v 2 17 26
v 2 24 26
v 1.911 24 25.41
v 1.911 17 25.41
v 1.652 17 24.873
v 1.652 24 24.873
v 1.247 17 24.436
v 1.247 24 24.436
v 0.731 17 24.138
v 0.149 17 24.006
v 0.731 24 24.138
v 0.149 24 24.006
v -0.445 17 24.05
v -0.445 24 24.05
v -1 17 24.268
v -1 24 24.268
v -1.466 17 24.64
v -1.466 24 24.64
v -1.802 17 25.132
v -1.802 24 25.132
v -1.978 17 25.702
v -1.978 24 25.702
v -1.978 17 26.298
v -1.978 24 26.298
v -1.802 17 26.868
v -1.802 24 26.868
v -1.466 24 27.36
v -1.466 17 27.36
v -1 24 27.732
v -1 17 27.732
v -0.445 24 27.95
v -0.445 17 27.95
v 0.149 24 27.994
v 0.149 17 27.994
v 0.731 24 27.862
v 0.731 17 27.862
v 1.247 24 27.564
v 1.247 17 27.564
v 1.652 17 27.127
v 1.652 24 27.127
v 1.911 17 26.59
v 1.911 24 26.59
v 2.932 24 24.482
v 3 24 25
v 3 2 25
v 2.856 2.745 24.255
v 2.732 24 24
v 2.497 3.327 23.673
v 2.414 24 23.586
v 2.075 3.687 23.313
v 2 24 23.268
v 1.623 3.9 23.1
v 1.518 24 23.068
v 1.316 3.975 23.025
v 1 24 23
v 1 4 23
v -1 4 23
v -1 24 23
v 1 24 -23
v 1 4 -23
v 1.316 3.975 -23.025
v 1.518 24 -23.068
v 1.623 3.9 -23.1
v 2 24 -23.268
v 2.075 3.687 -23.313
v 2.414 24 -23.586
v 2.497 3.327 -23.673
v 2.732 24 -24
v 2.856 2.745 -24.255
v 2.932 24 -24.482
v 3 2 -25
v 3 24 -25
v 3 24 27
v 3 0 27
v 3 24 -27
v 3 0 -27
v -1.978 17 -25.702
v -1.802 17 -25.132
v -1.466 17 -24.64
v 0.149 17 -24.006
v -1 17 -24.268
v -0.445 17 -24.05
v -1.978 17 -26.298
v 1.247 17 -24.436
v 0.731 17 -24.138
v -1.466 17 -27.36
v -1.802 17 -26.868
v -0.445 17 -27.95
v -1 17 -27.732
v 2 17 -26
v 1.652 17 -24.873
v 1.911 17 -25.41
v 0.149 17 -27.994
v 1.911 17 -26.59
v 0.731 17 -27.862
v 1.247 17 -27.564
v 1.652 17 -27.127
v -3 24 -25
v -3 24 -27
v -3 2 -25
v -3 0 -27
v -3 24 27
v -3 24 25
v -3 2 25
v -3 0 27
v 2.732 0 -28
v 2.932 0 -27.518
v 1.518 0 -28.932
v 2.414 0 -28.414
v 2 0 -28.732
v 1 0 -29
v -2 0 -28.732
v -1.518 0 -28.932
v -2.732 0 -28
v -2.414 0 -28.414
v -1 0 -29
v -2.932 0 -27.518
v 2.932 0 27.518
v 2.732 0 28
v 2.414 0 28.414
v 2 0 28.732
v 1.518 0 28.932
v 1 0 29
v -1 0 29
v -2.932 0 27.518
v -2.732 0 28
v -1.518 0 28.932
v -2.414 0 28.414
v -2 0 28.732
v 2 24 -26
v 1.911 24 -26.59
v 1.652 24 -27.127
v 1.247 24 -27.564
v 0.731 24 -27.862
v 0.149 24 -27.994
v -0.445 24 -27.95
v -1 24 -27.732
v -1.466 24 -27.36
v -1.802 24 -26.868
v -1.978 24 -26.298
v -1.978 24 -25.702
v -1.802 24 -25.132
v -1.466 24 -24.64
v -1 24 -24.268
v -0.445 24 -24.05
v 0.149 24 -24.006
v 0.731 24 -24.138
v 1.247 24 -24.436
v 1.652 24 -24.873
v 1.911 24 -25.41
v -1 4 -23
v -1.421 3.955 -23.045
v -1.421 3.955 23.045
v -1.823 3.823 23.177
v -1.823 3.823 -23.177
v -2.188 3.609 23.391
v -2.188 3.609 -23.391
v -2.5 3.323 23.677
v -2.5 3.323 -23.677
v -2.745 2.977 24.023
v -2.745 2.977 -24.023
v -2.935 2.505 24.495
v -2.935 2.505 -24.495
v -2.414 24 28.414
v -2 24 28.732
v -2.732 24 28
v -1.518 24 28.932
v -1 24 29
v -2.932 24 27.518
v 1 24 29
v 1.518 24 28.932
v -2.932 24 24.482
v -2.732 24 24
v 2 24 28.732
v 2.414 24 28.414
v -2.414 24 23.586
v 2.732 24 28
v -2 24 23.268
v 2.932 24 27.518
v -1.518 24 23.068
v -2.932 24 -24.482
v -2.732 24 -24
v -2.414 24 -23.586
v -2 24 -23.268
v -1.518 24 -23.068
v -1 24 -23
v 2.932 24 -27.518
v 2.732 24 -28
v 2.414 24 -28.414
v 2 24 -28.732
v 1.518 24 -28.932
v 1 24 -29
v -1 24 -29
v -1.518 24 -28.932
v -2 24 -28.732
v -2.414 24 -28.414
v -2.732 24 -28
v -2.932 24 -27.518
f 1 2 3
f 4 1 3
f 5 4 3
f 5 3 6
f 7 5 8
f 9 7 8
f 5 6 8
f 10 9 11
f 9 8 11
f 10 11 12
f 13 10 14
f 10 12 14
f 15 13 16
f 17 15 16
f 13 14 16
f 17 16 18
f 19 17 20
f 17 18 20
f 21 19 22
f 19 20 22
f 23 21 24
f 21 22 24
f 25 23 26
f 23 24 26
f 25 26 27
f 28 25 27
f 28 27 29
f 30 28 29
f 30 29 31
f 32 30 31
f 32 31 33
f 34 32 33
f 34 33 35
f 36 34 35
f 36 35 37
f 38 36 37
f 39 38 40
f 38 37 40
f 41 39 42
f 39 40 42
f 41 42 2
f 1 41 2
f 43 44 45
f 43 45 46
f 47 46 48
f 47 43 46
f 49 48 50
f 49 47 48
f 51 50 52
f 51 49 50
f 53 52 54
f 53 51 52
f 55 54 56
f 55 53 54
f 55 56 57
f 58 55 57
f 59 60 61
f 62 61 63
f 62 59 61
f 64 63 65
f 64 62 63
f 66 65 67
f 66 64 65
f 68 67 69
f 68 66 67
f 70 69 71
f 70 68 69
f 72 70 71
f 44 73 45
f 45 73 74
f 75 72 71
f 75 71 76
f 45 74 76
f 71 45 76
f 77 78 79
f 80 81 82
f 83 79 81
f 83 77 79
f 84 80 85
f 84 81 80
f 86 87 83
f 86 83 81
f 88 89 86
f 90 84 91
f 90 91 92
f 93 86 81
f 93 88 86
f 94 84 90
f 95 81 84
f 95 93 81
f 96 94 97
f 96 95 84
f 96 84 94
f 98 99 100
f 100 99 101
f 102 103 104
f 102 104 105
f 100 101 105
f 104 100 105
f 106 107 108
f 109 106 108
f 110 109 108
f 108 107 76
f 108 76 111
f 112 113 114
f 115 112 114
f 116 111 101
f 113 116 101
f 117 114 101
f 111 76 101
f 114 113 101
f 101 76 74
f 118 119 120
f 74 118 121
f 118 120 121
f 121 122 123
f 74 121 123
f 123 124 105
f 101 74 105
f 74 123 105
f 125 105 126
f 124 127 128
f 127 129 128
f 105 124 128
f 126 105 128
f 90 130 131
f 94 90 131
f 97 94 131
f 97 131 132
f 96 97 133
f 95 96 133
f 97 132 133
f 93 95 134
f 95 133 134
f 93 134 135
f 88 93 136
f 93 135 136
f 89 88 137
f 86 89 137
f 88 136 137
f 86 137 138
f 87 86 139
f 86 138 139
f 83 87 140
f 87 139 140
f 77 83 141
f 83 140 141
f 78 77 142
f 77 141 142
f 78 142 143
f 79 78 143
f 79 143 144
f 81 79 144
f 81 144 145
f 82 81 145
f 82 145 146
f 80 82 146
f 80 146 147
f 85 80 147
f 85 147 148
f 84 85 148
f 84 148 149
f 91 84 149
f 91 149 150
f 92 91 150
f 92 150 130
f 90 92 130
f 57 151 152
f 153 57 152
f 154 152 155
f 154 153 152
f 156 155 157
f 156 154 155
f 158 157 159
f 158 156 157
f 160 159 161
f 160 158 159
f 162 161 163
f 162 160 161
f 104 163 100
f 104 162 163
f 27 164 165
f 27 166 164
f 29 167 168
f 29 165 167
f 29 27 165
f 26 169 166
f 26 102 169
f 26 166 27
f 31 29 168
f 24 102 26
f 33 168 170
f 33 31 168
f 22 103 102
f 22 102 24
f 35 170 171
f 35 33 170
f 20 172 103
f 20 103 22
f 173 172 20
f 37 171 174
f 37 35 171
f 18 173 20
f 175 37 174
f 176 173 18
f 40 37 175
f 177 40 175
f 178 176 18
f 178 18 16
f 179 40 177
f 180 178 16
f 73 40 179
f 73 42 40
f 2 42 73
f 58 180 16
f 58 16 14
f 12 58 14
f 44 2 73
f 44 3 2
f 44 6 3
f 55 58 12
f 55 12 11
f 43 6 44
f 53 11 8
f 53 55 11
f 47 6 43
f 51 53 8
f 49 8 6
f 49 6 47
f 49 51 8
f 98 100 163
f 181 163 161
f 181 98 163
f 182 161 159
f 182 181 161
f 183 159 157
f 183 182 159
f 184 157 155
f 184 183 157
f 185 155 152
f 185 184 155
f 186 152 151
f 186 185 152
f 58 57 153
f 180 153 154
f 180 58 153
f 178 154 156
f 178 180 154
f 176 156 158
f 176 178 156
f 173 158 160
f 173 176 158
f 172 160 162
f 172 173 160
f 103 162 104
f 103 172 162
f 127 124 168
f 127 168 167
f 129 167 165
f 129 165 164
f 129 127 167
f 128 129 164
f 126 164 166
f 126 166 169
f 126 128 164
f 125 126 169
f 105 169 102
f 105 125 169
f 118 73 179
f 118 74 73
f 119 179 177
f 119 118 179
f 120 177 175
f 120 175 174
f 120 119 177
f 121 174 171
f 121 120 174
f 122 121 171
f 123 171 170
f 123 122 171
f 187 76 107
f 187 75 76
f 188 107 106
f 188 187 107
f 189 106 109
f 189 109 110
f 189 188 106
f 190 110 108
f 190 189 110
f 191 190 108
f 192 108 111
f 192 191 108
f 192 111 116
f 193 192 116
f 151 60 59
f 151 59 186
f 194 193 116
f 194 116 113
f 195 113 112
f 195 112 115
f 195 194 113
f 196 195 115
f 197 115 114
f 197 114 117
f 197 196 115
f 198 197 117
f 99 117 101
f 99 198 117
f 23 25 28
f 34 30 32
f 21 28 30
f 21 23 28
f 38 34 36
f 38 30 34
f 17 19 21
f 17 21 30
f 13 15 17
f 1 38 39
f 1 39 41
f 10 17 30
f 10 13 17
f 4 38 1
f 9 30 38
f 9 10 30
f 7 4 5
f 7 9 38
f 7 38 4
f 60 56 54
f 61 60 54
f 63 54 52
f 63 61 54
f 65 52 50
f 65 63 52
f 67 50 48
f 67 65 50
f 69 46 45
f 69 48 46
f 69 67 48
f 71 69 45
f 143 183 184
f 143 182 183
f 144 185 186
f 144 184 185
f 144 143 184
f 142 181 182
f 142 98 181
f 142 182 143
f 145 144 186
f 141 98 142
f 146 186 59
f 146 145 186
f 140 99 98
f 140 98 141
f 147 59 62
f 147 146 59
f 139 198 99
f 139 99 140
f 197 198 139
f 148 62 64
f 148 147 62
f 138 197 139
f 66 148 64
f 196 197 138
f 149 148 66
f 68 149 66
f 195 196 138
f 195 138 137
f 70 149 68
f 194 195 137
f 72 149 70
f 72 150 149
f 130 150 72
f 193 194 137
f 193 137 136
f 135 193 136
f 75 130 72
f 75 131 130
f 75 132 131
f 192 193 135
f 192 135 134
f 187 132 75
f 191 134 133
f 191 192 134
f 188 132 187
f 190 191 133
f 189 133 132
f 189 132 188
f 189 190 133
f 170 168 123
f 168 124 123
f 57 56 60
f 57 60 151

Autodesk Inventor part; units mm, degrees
ref_plane "YZ Plane" through (0, 0, 0) normal (1, 0, 0) x (0, 1, 0)
ref_plane "XZ Plane" through (0, 0, 0) normal (0, 1, 0) x (-1, 0, 0)
ref_plane "XY Plane" through (0, 0, 0) normal (0, 0, 1) x (1, 0, 0)
sketch "Sketch1" plane through (0, 0, 0) normal (0, 1, 0) x (-1, 0, 0)
  line L0 (-3, -29) -> (3, -29)
  line L1 (3, -29) -> (3, 29)
  line L2 (3, 29) -> (-3, 29)
  line L3 (-3, 29) -> (-3, -29)
  line L4 (-3, -29) -> (3, 29) construction
  line L5 (3, -29) -> (-3, 29) construction
  point P0 (0, 0)
  dimension "d0" = 58
  dimension "d1" = 6
extrude "Main Body Extrusion" add sketch "Sketch1" along normal blind 4
sketch "Sketch2" plane through (0, 4, 0) normal (0, 1, 0) x (1, 0, 0)
  line L0 (-3, 29) -> (-3, -29) projected
  line L1 (3, -29) -> (3, 29) projected
  line L2 (-3, -29) -> (3, -29)
  line L3 (3, -29) -> (3, -23)
  line L4 (3, -23) -> (-3, -23)
  line L5 (-3, -23) -> (-3, -29)
  line L6 (3, 29) -> (-3, 29) projected
  line L7 (-3, 29) -> (3, 29)
  line L8 (3, 29) -> (3, 23)
  line L9 (3, 23) -> (-3, 23)
  line L10 (-3, 23) -> (-3, 29)
  point P0 (0, 0)
  dimension "d4" = 6
  dimension "d5" = 6
  dimension "d6" = 6
  dimension "d7" = 6
  dimension "d8" = 6
extrude "Side Beams Extrusion" add sketch "Sketch2" along normal blind 20 contours L6 L1 L9 L0 | L4 L1 L2 L0
sketch "Sketch3" plane through (0, 24, 0) normal (0, 1, 0) x (1, 0, 0)
  line L0 (-3, 23) -> (-3, -23) projected
  line L1 (3, -23) -> (3, 23) projected
  circle A0 centre (0, 26) radius 2
  line L2 (-3, 23) -> (3, 23) projected
  line L3 (3, 29) -> (-3, 29) projected
  circle A1 centre (0, -26) radius 2
  line L4 (-3, -29) -> (3, -29) projected
  line L5 (3, -29) -> (3, -23) projected
  point P0 (0, 0)
  dimension "d11" = 6
  dimension "d12" = 4
  dimension "d13" = 3
  dimension "d14" = 6
  dimension "d15" = 3
  dimension "d16" = 4
  dimension "d17" = 3
  dimension "d18" = 3
extrude "Extrusion3" cut sketch "Sketch3" against normal blind 7
fillet "Fillet1" radius 2 10 edges at (-3, 14, -23) (-3, 12, -29) (-3, 4, 0) (3, 4, 0) (-3, 12, 29) (-3, 14, 23) (3, 12, 29) (3, 14, -23) (3, 12, -29) (3, 14, 23)
equation "\"d5\" = d4"
equation "\"d6\" = d4"
equation "\"d7\" = d4"
equation "\"d8\" = d4"
equation "\"d13\" = 0.5 * d14"
equation "\"d15\" = 0.5 * d11"
equation "\"d17\" = d13"
equation "\"d18\" = d15"
properties part number "Battery Holder"
